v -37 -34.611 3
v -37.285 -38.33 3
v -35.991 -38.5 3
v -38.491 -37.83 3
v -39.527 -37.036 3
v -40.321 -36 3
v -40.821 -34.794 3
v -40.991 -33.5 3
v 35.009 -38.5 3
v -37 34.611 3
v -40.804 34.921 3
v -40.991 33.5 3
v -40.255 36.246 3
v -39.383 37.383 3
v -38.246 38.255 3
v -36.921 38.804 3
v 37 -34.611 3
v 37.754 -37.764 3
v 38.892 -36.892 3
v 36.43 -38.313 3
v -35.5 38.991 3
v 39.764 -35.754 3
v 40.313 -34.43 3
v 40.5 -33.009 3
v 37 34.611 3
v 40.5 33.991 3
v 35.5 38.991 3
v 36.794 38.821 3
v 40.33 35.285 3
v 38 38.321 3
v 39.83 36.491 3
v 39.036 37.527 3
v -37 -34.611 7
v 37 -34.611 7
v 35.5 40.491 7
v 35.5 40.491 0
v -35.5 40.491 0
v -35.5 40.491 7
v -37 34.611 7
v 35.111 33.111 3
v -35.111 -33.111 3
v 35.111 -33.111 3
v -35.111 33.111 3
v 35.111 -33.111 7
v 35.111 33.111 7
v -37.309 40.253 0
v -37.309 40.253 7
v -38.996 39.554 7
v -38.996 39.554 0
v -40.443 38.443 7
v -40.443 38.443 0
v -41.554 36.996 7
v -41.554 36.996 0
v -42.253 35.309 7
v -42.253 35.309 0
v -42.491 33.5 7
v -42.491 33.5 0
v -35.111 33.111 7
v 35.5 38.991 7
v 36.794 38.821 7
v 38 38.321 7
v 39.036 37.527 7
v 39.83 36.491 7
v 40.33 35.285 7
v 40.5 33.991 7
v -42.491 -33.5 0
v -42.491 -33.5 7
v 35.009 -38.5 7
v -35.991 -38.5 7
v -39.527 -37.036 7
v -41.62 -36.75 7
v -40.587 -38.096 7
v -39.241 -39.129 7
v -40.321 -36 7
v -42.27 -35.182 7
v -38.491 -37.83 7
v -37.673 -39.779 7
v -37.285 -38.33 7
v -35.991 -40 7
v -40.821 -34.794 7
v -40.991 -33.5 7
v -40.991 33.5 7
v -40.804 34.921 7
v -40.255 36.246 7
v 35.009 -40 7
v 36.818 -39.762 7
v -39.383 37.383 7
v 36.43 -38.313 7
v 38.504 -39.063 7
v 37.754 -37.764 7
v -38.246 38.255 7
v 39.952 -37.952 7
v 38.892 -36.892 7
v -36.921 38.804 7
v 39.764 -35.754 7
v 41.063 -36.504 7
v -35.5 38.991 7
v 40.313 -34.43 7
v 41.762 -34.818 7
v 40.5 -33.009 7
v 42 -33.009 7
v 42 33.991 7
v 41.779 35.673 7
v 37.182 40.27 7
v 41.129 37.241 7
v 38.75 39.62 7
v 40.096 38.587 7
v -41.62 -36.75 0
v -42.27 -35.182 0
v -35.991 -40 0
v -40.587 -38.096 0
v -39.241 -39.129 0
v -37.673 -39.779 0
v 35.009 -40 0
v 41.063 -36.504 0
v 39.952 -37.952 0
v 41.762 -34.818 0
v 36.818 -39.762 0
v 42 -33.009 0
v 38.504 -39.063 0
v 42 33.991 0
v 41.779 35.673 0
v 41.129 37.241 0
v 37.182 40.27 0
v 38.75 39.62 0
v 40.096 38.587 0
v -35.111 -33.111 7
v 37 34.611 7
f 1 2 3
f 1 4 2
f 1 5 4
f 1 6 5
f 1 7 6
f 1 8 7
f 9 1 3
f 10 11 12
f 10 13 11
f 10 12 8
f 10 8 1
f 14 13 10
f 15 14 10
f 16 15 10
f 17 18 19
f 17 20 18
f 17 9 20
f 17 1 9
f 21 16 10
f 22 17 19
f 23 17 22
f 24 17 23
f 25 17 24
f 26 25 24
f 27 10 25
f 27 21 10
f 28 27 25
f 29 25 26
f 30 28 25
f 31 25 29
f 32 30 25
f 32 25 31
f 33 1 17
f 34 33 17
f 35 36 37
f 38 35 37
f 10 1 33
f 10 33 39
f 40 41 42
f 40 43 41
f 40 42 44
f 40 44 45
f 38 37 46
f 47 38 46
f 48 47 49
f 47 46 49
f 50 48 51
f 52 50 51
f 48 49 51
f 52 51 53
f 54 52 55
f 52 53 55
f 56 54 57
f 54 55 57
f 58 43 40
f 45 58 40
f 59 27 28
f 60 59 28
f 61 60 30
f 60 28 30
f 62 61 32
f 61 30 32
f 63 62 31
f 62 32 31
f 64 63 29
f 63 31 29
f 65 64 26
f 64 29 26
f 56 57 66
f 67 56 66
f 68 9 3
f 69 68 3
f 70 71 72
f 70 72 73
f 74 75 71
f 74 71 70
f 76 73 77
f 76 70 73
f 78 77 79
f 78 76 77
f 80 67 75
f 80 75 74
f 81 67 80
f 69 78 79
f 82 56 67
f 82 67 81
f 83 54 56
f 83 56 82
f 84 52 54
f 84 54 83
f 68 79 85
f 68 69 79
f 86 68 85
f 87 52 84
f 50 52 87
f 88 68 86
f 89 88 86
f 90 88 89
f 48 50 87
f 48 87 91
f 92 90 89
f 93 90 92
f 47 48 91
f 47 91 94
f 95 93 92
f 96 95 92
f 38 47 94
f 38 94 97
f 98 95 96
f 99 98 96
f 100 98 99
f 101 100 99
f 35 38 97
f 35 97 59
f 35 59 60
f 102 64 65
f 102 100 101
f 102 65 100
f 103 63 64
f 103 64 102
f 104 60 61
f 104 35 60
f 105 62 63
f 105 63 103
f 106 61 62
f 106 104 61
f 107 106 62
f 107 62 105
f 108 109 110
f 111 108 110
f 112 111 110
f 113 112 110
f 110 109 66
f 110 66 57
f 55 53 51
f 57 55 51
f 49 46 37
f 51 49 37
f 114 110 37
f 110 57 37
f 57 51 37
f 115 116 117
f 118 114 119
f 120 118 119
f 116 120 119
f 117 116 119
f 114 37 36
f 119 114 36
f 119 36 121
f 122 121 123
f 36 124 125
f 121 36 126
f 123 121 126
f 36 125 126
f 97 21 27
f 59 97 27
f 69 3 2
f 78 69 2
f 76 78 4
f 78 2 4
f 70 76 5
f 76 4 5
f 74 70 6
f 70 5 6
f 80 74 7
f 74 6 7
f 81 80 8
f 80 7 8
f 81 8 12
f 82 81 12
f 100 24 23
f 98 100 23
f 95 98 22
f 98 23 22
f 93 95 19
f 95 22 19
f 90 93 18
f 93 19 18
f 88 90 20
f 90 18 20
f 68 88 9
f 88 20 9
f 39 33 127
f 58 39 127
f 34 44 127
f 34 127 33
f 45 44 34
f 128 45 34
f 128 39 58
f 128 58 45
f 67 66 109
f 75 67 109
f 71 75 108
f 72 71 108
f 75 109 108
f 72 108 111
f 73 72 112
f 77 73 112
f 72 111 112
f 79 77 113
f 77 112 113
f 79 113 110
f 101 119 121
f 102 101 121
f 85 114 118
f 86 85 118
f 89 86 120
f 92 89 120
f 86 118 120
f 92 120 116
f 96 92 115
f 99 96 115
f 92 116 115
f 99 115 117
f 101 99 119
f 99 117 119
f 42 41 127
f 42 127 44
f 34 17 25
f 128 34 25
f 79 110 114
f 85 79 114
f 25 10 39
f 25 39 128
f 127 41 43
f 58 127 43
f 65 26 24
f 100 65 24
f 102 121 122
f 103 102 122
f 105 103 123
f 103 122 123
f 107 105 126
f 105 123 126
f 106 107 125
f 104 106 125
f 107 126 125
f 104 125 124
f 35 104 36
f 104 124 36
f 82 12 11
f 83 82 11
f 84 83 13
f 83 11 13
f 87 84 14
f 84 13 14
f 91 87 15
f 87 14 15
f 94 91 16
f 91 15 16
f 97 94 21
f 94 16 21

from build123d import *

# Parameters (mm, degrees)
F0_W     = 74
F0_H     = 69.2229812741
F0_W_2   = 70.2229812741
F0_H_2   = 66.2229812741
F1_DEPTH = 3
F2_DEPTH = 7
F3_DEPTH = 7


with BuildPart() as f1:
    # F0 (on Top) → F1 (new body)
    with BuildSketch(Plane.XY):
        with BuildLine():
            Line((42, -33.0089111648), (42, 33.9910888352))
            ThreePointArc((42, 33.9910888352), (40.0961940777, 38.587282913), (35.5, 40.4910888352))
            Line((35.5, 40.4910888352), (-35.5, 40.4910888352))
            ThreePointArc((-35.5, 40.4910888352), (-40.4434463233, 38.4434463233), (-42.4910888352, 33.5))
            Line((-42.4910888352, 33.5), (-42.4910888352, -33.5))
            ThreePointArc((-42.4910888352, -33.5), (-40.587282913, -38.0961940777), (-35.9910888352, -40))
            Line((-35.9910888352, -40), (35.0089111648, -40))
            ThreePointArc((35.0089111648, -40), (39.952357488, -37.952357488), (42, -33.0089111648))
        make_face()
        with BuildLine():
            ThreePointArc((-40.9910888352, 33.5), (-39.3827861515, 37.3827861515), (-35.5, 38.9910888352))
            Line((-35.5, 38.9910888352), (35.5, 38.9910888352))
            ThreePointArc((35.5, 38.9910888352), (39.0355339059, 37.5266227412), (40.5, 33.9910888352))
            Line((40.5, 33.9910888352), (40.5, -33.0089111648))
            ThreePointArc((40.5, -33.0089111648), (38.8916973163, -36.8916973163), (35.0089111648, -38.5))
            Line((35.0089111648, -38.5), (-35.9910888352, -38.5))
            ThreePointArc((-35.9910888352, -38.5), (-39.5266227412, -37.0355339059), (-40.9910888352, -33.5))
            Line((-40.9910888352, -33.5), (-40.9910888352, 33.5))
        make_face(mode=Mode.SUBTRACT)
        with BuildLine():
            Line((35.5, 38.9910888352), (-35.5, 38.9910888352))
            ThreePointArc((-35.5, 38.9910888352), (-39.3827861515, 37.3827861515), (-40.9910888352, 33.5))
            Line((-40.9910888352, 33.5), (-40.9910888352, -33.5))
            ThreePointArc((-40.9910888352, -33.5), (-39.5266227412, -37.0355339059), (-35.9910888352, -38.5))
            Line((-35.9910888352, -38.5), (35.0089111648, -38.5))
            ThreePointArc((35.0089111648, -38.5), (38.8916973163, -36.8916973163), (40.5, -33.0089111648))
            Line((40.5, -33.0089111648), (40.5, 33.9910888352))
            ThreePointArc((40.5, 33.9910888352), (39.0355339059, 37.5266227412), (35.5, 38.9910888352))
        make_face()
        Rectangle(F0_W, F0_H, mode=Mode.SUBTRACT)
        Rectangle(F0_W, F0_H)
        Rectangle(F0_W_2, F0_H_2, mode=Mode.SUBTRACT)
        Rectangle(F0_W_2, F0_H_2)
    extrude(amount=F1_DEPTH)

    # F0 (on Top) → F2 (join)
    with BuildSketch(Plane.XY):
        with BuildLine():
            Line((42, -33.0089111648), (42, 33.9910888352))
            ThreePointArc((42, 33.9910888352), (40.0961940777, 38.587282913), (35.5, 40.4910888352))
            Line((35.5, 40.4910888352), (-35.5, 40.4910888352))
            ThreePointArc((-35.5, 40.4910888352), (-40.4434463233, 38.4434463233), (-42.4910888352, 33.5))
            Line((-42.4910888352, 33.5), (-42.4910888352, -33.5))
            ThreePointArc((-42.4910888352, -33.5), (-40.587282913, -38.0961940777), (-35.9910888352, -40))
            Line((-35.9910888352, -40), (35.0089111648, -40))
            ThreePointArc((35.0089111648, -40), (39.952357488, -37.952357488), (42, -33.0089111648))
        make_face()
        with BuildLine():
            ThreePointArc((-40.9910888352, 33.5), (-39.3827861515, 37.3827861515), (-35.5, 38.9910888352))
            Line((-35.5, 38.9910888352), (35.5, 38.9910888352))
            ThreePointArc((35.5, 38.9910888352), (39.0355339059, 37.5266227412), (40.5, 33.9910888352))
            Line((40.5, 33.9910888352), (40.5, -33.0089111648))
            ThreePointArc((40.5, -33.0089111648), (38.8916973163, -36.8916973163), (35.0089111648, -38.5))
            Line((35.0089111648, -38.5), (-35.9910888352, -38.5))
            ThreePointArc((-35.9910888352, -38.5), (-39.5266227412, -37.0355339059), (-40.9910888352, -33.5))
            Line((-40.9910888352, -33.5), (-40.9910888352, 33.5))
        make_face(mode=Mode.SUBTRACT)
    extrude(amount=F2_DEPTH)

    # F0 (on Top) → F3 (join)
    with BuildSketch(Plane.XY):
        Rectangle(F0_W, F0_H)
        Rectangle(F0_W_2, F0_H_2, mode=Mode.SUBTRACT)
    extrude(amount=F3_DEPTH)


solid = f1.part
